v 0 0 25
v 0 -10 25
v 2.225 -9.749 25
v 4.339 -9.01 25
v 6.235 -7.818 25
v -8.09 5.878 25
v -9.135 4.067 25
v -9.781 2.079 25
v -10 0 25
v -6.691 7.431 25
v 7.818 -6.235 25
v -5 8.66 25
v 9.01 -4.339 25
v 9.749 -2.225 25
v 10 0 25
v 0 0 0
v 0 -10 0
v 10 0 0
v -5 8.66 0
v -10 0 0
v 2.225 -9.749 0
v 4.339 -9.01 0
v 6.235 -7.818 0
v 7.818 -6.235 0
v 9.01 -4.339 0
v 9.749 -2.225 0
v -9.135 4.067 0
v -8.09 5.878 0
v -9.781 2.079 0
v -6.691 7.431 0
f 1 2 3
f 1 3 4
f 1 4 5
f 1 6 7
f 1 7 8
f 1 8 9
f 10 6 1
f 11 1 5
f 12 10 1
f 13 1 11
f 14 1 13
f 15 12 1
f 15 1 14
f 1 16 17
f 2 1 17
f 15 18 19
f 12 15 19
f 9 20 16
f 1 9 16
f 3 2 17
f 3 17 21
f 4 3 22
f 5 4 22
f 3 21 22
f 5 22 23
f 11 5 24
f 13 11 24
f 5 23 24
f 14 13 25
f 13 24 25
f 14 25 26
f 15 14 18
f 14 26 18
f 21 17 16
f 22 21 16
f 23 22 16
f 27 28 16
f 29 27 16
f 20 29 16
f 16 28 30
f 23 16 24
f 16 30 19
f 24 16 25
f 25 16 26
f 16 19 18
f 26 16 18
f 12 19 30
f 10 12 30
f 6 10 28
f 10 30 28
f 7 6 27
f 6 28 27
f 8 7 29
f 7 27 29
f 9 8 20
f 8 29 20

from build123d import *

# Parameters (mm, degrees)
BOSS_EXTRUDE1_DEPTH = 25


with BuildPart() as part:
    # Sketch1 → Boss-Extrude1 (new body)
    with BuildSketch(Plane.XY):
        with BuildLine():
            Line((-10, 0), (0, 0))
            Line((0, 0), (0, -10))
            ThreePointArc((0, -10), (7.071067812, -7.071067812), (10, 0))
            Line((10, 0), (-5, 8.660254038))
            ThreePointArc((-5, 8.660254038), (-8.660254038, 5), (-10, 0))
        make_face()
    extrude(amount=BOSS_EXTRUDE1_DEPTH)


solid = part.part
